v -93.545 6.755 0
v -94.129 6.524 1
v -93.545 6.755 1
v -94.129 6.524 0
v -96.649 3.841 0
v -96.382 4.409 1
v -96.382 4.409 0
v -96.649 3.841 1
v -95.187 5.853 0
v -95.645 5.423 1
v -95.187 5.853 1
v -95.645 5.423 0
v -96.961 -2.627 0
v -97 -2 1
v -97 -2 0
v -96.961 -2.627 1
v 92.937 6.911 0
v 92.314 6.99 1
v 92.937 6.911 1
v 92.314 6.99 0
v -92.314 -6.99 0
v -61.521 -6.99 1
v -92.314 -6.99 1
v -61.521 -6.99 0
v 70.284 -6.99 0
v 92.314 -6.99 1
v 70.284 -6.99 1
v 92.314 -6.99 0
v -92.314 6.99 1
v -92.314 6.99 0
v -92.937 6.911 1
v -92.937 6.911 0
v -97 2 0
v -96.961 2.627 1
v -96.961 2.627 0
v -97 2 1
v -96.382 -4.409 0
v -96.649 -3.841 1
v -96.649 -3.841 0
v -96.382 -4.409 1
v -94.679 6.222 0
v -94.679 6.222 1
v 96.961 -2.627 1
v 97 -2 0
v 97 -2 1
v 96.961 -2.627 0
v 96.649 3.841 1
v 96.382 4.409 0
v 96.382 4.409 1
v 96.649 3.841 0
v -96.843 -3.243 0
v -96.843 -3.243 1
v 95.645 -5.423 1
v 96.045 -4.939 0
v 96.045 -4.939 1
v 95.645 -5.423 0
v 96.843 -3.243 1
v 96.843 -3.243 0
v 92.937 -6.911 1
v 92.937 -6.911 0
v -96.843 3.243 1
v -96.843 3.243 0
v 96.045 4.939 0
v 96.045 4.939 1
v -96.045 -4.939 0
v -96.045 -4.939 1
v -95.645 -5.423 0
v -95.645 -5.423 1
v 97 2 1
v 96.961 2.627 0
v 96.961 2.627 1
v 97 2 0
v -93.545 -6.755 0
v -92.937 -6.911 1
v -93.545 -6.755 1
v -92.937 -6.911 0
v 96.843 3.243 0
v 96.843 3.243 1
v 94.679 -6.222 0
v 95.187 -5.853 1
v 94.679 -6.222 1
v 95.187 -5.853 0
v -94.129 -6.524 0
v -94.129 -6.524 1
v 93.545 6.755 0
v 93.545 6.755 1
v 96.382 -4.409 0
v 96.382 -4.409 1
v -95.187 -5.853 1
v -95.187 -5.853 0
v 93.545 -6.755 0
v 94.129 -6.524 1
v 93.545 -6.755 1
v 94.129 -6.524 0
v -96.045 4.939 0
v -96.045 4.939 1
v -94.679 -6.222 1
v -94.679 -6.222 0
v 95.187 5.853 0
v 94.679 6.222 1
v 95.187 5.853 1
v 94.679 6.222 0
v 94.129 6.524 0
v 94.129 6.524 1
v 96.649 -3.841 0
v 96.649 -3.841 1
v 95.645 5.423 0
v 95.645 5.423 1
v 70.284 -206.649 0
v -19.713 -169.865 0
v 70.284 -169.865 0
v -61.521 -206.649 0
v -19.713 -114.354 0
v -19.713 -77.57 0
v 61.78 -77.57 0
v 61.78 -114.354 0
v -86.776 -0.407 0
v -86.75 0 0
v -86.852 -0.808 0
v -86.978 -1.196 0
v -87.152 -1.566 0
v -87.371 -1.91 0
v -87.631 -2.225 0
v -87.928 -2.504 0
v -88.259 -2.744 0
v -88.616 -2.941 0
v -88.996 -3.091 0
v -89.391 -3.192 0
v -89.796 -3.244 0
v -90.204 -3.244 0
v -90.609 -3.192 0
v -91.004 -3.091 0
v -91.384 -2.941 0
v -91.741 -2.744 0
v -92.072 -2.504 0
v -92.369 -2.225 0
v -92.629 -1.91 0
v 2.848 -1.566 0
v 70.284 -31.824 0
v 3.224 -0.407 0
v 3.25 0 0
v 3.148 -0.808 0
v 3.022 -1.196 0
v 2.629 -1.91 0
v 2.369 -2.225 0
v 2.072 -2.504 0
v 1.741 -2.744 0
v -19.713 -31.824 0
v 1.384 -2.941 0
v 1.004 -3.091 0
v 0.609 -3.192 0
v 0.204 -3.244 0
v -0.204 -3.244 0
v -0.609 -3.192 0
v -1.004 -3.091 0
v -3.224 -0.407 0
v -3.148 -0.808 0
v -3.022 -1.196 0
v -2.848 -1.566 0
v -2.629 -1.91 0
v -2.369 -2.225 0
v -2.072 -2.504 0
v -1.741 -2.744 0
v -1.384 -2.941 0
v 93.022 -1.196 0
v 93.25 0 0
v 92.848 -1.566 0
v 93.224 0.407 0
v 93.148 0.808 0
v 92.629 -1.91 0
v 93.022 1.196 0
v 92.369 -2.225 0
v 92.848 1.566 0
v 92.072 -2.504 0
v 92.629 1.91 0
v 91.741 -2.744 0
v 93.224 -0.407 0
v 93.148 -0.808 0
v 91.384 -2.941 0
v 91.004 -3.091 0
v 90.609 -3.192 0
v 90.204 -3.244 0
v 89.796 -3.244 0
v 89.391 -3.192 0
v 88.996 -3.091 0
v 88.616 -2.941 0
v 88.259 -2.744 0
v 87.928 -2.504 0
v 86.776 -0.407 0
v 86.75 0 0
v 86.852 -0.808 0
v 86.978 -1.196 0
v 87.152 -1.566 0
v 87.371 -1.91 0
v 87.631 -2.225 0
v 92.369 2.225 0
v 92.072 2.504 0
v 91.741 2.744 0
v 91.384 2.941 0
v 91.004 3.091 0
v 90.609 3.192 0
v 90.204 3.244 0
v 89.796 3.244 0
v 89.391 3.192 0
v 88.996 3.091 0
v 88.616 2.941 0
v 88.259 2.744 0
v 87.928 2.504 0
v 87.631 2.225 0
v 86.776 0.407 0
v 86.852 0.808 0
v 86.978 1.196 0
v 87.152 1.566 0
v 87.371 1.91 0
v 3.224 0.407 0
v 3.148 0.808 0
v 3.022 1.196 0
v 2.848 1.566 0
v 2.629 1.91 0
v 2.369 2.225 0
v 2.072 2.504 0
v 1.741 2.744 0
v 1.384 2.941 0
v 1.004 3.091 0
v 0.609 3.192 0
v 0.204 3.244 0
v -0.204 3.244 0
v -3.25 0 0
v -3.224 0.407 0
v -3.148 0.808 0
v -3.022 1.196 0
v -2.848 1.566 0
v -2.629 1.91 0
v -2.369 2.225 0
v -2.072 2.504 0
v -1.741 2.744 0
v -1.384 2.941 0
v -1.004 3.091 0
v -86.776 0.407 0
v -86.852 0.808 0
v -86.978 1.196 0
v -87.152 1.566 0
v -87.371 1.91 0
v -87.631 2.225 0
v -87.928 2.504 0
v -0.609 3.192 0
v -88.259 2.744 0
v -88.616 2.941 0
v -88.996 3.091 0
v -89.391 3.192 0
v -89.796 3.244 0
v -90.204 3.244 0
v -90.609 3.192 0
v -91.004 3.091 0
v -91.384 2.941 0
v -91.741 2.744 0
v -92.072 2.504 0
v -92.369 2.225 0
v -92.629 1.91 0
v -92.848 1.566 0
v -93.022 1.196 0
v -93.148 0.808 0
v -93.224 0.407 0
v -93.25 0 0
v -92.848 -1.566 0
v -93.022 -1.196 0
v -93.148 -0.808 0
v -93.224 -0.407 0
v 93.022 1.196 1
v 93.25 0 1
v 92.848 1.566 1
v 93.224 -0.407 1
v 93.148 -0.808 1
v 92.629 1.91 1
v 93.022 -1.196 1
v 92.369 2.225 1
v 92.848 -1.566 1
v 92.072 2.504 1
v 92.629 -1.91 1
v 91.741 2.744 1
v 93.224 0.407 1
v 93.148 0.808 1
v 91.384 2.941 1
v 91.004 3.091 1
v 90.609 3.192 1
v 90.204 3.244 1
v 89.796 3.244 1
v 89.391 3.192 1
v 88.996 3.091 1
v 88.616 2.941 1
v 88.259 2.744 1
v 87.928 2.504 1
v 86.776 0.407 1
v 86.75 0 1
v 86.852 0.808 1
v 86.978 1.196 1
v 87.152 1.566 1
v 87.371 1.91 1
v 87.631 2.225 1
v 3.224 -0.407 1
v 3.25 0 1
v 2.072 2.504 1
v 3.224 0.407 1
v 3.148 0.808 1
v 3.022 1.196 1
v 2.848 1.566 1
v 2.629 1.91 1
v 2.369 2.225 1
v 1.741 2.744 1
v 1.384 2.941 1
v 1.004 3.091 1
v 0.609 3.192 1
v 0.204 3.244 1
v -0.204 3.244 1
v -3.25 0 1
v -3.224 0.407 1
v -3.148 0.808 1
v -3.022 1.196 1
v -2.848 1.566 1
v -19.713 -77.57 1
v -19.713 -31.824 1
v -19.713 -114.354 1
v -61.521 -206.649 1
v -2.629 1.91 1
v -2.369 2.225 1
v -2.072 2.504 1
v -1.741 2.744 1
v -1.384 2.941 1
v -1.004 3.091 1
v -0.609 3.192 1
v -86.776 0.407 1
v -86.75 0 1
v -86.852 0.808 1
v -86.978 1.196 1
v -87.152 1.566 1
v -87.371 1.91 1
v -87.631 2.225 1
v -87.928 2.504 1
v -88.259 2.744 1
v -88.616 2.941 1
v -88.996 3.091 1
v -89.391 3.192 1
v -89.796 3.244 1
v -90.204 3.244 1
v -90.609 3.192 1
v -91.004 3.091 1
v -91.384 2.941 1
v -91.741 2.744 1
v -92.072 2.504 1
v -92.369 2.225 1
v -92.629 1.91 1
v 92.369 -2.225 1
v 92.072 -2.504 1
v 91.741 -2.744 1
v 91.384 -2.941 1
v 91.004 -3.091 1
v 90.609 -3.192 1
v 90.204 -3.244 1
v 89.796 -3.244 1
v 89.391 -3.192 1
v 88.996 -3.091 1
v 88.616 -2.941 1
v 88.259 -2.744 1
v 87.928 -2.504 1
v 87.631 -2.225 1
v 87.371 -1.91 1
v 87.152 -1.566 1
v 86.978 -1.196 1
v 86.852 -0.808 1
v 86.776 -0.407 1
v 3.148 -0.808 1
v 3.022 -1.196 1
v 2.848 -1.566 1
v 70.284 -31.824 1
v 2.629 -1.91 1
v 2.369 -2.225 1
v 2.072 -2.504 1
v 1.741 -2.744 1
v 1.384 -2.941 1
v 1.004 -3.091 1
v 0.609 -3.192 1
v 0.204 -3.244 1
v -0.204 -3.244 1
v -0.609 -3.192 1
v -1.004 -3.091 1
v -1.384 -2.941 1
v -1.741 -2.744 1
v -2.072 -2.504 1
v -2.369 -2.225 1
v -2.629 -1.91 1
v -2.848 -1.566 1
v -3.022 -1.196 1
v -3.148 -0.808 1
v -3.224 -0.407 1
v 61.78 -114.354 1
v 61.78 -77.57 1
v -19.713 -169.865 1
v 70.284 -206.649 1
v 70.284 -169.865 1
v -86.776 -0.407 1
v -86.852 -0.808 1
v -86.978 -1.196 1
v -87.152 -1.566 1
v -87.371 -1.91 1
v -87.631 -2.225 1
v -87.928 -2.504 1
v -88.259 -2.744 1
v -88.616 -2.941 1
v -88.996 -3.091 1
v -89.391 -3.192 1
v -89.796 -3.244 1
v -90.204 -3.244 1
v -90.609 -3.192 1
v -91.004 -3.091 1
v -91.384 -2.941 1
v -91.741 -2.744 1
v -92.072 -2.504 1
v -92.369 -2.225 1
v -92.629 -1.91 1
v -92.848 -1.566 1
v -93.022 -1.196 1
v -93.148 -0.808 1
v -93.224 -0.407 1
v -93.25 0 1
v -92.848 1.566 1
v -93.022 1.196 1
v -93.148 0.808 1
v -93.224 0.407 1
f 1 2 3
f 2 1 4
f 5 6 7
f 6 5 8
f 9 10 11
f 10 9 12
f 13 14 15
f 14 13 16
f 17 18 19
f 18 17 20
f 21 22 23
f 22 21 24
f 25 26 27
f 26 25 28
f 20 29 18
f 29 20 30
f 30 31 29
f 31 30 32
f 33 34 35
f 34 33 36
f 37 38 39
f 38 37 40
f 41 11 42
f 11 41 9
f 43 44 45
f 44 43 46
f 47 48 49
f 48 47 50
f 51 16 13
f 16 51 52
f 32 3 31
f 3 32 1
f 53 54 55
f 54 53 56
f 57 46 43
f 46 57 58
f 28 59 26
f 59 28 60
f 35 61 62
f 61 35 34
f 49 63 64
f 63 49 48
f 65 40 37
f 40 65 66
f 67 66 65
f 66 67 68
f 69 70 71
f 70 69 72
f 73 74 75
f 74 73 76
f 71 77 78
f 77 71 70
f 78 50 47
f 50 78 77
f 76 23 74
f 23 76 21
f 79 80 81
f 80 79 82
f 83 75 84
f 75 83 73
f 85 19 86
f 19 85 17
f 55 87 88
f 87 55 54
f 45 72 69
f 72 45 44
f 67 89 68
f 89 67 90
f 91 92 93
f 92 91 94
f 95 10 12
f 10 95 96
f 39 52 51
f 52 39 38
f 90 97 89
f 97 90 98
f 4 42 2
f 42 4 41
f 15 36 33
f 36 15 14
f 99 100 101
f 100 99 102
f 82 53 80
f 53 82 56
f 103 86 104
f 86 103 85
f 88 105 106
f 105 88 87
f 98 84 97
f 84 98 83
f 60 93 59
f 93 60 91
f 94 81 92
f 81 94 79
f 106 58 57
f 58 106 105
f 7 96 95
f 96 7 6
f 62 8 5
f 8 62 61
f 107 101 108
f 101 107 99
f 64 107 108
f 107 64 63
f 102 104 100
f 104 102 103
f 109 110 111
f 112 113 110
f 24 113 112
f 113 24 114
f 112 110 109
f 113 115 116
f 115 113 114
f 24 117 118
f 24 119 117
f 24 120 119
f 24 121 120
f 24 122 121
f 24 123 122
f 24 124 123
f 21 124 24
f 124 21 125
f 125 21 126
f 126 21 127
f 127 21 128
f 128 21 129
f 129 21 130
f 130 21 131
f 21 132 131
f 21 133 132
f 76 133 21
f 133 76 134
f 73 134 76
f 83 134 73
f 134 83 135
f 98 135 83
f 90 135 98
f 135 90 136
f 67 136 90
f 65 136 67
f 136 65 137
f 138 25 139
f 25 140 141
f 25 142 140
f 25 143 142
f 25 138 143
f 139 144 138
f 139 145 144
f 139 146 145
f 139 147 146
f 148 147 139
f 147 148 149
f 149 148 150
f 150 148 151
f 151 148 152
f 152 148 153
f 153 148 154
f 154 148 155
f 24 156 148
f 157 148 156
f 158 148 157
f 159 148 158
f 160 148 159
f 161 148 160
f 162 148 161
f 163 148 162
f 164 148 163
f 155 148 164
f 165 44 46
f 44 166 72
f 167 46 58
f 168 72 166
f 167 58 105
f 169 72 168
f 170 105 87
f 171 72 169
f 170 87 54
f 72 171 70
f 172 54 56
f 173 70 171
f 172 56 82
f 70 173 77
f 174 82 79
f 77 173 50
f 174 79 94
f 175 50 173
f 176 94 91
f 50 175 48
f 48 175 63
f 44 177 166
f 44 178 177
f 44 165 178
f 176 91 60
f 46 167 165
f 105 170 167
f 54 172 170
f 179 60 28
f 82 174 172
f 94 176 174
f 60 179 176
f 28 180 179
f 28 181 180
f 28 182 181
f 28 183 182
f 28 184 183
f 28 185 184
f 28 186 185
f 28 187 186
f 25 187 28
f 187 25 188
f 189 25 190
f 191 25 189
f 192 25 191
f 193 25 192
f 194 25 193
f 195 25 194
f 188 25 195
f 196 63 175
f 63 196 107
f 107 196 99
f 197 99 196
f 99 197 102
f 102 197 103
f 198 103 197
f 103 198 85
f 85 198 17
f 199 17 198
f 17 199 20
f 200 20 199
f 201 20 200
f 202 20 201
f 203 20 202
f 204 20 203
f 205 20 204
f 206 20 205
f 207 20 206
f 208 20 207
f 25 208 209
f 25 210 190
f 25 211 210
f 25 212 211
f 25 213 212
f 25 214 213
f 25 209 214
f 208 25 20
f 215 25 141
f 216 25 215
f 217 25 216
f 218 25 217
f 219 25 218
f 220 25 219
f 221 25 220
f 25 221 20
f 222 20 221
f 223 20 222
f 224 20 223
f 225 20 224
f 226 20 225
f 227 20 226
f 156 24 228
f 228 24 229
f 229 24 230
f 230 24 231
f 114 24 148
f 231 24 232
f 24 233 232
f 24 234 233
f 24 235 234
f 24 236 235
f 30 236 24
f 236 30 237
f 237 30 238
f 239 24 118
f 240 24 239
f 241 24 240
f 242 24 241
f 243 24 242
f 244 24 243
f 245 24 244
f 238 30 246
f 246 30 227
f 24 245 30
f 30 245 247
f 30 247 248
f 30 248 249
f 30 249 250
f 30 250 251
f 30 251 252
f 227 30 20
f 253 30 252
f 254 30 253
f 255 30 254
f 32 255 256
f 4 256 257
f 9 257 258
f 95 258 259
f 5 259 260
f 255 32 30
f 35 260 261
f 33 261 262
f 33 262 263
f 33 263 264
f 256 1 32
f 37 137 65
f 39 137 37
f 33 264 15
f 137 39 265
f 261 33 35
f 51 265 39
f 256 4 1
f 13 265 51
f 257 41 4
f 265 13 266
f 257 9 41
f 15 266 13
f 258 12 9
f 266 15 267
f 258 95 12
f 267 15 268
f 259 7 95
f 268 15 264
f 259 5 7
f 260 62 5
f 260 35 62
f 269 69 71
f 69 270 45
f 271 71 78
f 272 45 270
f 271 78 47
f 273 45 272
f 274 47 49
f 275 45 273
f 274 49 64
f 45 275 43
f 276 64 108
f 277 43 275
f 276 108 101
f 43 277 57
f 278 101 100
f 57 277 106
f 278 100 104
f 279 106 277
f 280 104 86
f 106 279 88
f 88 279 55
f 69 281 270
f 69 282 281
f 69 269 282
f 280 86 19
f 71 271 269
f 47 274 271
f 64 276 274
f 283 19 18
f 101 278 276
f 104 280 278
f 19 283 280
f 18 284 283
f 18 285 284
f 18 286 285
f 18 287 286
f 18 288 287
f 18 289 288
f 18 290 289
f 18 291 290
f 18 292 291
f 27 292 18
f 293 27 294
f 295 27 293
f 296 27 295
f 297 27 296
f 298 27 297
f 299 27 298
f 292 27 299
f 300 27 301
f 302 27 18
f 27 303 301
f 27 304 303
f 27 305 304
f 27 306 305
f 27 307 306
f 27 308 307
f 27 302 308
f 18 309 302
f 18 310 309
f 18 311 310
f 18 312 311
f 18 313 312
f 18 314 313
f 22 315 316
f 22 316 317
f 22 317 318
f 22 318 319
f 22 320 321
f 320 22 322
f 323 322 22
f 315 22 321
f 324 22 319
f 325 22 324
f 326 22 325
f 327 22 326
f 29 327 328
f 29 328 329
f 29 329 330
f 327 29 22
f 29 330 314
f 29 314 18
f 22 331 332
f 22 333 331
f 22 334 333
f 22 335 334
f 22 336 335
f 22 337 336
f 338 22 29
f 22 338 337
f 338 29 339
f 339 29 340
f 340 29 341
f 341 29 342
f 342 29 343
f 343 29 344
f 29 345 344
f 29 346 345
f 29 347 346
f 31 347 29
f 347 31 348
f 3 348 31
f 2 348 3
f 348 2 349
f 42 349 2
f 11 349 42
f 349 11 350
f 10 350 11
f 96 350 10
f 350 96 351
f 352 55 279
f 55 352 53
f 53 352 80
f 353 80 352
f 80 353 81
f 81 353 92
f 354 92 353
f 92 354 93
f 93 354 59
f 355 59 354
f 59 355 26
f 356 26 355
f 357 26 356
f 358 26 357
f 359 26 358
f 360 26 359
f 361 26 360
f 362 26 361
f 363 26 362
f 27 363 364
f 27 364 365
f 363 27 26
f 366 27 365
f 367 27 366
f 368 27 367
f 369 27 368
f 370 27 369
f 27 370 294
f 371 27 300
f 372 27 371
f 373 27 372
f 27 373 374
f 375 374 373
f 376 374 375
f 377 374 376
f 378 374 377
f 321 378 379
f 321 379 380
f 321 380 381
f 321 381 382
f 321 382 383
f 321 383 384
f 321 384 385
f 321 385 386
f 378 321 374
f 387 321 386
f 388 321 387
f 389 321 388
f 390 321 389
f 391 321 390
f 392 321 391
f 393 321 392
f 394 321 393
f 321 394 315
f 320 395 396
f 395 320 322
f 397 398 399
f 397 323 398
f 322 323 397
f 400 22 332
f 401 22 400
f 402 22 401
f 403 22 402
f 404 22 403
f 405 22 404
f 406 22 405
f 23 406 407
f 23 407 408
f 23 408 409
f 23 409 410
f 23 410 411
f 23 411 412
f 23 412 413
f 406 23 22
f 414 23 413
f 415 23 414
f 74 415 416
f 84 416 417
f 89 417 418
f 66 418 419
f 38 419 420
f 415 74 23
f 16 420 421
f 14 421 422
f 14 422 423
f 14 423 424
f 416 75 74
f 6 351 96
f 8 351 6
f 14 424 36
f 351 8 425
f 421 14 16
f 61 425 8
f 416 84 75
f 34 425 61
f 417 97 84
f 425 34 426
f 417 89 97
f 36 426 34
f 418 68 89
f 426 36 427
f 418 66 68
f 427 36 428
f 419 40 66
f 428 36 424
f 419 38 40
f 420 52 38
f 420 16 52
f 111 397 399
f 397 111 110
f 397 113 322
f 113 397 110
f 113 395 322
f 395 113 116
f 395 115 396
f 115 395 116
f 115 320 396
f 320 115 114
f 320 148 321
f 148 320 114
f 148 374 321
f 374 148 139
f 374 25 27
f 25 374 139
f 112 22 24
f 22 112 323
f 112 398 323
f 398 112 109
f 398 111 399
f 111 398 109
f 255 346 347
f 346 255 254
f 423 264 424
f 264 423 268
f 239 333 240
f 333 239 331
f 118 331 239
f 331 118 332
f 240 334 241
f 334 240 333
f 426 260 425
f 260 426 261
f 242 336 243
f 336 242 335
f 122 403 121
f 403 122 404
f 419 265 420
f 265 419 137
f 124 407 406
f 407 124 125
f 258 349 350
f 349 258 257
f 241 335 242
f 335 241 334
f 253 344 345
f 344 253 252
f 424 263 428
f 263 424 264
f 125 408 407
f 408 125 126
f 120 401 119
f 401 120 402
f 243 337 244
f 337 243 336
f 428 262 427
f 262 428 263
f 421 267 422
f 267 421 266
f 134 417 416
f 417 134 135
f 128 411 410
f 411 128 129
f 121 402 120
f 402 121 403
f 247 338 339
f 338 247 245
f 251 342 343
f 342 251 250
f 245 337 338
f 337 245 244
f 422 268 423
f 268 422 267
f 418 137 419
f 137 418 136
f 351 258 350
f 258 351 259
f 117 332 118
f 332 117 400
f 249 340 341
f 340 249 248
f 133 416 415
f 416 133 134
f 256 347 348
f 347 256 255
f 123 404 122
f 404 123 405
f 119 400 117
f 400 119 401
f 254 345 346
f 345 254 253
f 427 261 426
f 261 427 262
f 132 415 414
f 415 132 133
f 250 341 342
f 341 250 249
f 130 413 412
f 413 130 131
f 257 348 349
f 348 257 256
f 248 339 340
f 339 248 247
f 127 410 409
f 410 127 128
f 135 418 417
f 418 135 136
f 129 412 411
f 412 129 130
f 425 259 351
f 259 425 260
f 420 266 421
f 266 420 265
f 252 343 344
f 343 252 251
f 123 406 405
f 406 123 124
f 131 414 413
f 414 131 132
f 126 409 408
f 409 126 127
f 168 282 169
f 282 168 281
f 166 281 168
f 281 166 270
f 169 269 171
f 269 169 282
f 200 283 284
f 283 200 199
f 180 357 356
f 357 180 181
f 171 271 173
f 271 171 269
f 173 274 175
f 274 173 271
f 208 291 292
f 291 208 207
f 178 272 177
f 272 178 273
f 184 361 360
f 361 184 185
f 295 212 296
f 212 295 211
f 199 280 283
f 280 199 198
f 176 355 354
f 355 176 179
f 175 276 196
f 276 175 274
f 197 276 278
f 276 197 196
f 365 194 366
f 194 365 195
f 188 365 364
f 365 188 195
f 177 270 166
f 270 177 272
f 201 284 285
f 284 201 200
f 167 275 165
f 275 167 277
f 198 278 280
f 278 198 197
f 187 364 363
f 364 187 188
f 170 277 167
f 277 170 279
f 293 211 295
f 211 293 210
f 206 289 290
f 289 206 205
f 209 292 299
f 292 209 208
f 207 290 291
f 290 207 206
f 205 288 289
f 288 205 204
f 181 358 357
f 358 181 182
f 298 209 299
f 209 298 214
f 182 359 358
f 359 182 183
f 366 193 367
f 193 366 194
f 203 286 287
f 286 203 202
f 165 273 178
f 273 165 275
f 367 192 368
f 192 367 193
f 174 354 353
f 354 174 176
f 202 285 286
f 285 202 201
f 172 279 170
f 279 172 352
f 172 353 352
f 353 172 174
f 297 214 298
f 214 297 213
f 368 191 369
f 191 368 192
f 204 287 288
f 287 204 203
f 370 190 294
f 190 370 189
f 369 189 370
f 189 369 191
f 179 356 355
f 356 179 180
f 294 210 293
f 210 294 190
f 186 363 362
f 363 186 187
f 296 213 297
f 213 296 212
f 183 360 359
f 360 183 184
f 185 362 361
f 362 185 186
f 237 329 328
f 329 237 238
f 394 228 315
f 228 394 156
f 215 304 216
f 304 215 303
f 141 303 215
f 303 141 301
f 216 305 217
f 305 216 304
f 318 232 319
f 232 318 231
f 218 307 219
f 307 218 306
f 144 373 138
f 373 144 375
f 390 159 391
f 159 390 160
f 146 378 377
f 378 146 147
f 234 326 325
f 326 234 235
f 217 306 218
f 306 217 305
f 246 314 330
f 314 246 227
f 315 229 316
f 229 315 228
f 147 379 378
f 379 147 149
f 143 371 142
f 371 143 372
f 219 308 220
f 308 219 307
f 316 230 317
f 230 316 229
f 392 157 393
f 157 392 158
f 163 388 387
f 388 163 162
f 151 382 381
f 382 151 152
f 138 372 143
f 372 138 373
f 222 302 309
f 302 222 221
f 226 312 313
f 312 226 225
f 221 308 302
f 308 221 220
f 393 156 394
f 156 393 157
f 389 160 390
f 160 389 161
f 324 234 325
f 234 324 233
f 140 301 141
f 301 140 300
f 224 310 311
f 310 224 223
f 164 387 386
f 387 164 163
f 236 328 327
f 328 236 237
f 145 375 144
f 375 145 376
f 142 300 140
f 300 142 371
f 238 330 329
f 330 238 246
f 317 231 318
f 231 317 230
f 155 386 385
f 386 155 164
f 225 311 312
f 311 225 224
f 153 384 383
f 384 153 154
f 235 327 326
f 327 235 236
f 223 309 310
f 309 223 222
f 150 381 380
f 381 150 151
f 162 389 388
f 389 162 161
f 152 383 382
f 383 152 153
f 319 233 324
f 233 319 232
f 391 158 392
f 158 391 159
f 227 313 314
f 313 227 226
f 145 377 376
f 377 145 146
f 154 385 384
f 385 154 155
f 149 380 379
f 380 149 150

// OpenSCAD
$fn = 50;


difference() {
	union() {
		translate(v = [0, 0, 0]) {
			rotate(a = [0, 0, 0]) {
				hull() {
					translate(v = [-92.0000000000, 2.0000000000, 0]) {
						rotate(a = [0, 0, 0]) {
							translate(v = [0, 0, 0]) {
								rotate(a = [0, 0, 0]) {
									cylinder(h = 1, r = 5);
								}
							}
						}
					}
					translate(v = [92.0000000000, 2.0000000000, 0]) {
						rotate(a = [0, 0, 0]) {
							translate(v = [0, 0, 0]) {
								rotate(a = [0, 0, 0]) {
									cylinder(h = 1, r = 5);
								}
							}
						}
					}
					translate(v = [-92.0000000000, -2.0000000000, 0]) {
						rotate(a = [0, 0, 0]) {
							translate(v = [0, 0, 0]) {
								rotate(a = [0, 0, 0]) {
									cylinder(h = 1, r = 5);
								}
							}
						}
					}
					translate(v = [92.0000000000, -2.0000000000, 0]) {
						rotate(a = [0, 0, 0]) {
							translate(v = [0, 0, 0]) {
								rotate(a = [0, 0, 0]) {
									cylinder(h = 1, r = 5);
								}
							}
						}
					}
				}
			}
		}
		translate(v = [0, 0, 0]) {
			rotate(a = [0, 0, 0]) {
				linear_extrude(height = 1) {
					text(font = "DejaVu Sans Mono:style=Bold", halign = "center", size = 209.0000000000, text = "E", valign = "top");
				}
			}
		}
	}
	union() {
		translate(v = [-90.0000000000, 0.0000000000, -125.0000000000]) {
			rotate(a = [0, 0, 0]) {
				cylinder(h = 250, r = 3.2500000000);
			}
		}
		translate(v = [90.0000000000, 0.0000000000, -125.0000000000]) {
			rotate(a = [0, 0, 0]) {
				cylinder(h = 250, r = 3.2500000000);
			}
		}
		translate(v = [90.0000000000, 0.0000000000, -125.0000000000]) {
			rotate(a = [0, 0, 0]) {
				cylinder(h = 250, r = 3.2500000000);
			}
		}
		translate(v = [0, 0, -125.0000000000]) {
			rotate(a = [0, 0, 0]) {
				cylinder(h = 250, r = 3.2500000000);
			}
		}
	}
}
